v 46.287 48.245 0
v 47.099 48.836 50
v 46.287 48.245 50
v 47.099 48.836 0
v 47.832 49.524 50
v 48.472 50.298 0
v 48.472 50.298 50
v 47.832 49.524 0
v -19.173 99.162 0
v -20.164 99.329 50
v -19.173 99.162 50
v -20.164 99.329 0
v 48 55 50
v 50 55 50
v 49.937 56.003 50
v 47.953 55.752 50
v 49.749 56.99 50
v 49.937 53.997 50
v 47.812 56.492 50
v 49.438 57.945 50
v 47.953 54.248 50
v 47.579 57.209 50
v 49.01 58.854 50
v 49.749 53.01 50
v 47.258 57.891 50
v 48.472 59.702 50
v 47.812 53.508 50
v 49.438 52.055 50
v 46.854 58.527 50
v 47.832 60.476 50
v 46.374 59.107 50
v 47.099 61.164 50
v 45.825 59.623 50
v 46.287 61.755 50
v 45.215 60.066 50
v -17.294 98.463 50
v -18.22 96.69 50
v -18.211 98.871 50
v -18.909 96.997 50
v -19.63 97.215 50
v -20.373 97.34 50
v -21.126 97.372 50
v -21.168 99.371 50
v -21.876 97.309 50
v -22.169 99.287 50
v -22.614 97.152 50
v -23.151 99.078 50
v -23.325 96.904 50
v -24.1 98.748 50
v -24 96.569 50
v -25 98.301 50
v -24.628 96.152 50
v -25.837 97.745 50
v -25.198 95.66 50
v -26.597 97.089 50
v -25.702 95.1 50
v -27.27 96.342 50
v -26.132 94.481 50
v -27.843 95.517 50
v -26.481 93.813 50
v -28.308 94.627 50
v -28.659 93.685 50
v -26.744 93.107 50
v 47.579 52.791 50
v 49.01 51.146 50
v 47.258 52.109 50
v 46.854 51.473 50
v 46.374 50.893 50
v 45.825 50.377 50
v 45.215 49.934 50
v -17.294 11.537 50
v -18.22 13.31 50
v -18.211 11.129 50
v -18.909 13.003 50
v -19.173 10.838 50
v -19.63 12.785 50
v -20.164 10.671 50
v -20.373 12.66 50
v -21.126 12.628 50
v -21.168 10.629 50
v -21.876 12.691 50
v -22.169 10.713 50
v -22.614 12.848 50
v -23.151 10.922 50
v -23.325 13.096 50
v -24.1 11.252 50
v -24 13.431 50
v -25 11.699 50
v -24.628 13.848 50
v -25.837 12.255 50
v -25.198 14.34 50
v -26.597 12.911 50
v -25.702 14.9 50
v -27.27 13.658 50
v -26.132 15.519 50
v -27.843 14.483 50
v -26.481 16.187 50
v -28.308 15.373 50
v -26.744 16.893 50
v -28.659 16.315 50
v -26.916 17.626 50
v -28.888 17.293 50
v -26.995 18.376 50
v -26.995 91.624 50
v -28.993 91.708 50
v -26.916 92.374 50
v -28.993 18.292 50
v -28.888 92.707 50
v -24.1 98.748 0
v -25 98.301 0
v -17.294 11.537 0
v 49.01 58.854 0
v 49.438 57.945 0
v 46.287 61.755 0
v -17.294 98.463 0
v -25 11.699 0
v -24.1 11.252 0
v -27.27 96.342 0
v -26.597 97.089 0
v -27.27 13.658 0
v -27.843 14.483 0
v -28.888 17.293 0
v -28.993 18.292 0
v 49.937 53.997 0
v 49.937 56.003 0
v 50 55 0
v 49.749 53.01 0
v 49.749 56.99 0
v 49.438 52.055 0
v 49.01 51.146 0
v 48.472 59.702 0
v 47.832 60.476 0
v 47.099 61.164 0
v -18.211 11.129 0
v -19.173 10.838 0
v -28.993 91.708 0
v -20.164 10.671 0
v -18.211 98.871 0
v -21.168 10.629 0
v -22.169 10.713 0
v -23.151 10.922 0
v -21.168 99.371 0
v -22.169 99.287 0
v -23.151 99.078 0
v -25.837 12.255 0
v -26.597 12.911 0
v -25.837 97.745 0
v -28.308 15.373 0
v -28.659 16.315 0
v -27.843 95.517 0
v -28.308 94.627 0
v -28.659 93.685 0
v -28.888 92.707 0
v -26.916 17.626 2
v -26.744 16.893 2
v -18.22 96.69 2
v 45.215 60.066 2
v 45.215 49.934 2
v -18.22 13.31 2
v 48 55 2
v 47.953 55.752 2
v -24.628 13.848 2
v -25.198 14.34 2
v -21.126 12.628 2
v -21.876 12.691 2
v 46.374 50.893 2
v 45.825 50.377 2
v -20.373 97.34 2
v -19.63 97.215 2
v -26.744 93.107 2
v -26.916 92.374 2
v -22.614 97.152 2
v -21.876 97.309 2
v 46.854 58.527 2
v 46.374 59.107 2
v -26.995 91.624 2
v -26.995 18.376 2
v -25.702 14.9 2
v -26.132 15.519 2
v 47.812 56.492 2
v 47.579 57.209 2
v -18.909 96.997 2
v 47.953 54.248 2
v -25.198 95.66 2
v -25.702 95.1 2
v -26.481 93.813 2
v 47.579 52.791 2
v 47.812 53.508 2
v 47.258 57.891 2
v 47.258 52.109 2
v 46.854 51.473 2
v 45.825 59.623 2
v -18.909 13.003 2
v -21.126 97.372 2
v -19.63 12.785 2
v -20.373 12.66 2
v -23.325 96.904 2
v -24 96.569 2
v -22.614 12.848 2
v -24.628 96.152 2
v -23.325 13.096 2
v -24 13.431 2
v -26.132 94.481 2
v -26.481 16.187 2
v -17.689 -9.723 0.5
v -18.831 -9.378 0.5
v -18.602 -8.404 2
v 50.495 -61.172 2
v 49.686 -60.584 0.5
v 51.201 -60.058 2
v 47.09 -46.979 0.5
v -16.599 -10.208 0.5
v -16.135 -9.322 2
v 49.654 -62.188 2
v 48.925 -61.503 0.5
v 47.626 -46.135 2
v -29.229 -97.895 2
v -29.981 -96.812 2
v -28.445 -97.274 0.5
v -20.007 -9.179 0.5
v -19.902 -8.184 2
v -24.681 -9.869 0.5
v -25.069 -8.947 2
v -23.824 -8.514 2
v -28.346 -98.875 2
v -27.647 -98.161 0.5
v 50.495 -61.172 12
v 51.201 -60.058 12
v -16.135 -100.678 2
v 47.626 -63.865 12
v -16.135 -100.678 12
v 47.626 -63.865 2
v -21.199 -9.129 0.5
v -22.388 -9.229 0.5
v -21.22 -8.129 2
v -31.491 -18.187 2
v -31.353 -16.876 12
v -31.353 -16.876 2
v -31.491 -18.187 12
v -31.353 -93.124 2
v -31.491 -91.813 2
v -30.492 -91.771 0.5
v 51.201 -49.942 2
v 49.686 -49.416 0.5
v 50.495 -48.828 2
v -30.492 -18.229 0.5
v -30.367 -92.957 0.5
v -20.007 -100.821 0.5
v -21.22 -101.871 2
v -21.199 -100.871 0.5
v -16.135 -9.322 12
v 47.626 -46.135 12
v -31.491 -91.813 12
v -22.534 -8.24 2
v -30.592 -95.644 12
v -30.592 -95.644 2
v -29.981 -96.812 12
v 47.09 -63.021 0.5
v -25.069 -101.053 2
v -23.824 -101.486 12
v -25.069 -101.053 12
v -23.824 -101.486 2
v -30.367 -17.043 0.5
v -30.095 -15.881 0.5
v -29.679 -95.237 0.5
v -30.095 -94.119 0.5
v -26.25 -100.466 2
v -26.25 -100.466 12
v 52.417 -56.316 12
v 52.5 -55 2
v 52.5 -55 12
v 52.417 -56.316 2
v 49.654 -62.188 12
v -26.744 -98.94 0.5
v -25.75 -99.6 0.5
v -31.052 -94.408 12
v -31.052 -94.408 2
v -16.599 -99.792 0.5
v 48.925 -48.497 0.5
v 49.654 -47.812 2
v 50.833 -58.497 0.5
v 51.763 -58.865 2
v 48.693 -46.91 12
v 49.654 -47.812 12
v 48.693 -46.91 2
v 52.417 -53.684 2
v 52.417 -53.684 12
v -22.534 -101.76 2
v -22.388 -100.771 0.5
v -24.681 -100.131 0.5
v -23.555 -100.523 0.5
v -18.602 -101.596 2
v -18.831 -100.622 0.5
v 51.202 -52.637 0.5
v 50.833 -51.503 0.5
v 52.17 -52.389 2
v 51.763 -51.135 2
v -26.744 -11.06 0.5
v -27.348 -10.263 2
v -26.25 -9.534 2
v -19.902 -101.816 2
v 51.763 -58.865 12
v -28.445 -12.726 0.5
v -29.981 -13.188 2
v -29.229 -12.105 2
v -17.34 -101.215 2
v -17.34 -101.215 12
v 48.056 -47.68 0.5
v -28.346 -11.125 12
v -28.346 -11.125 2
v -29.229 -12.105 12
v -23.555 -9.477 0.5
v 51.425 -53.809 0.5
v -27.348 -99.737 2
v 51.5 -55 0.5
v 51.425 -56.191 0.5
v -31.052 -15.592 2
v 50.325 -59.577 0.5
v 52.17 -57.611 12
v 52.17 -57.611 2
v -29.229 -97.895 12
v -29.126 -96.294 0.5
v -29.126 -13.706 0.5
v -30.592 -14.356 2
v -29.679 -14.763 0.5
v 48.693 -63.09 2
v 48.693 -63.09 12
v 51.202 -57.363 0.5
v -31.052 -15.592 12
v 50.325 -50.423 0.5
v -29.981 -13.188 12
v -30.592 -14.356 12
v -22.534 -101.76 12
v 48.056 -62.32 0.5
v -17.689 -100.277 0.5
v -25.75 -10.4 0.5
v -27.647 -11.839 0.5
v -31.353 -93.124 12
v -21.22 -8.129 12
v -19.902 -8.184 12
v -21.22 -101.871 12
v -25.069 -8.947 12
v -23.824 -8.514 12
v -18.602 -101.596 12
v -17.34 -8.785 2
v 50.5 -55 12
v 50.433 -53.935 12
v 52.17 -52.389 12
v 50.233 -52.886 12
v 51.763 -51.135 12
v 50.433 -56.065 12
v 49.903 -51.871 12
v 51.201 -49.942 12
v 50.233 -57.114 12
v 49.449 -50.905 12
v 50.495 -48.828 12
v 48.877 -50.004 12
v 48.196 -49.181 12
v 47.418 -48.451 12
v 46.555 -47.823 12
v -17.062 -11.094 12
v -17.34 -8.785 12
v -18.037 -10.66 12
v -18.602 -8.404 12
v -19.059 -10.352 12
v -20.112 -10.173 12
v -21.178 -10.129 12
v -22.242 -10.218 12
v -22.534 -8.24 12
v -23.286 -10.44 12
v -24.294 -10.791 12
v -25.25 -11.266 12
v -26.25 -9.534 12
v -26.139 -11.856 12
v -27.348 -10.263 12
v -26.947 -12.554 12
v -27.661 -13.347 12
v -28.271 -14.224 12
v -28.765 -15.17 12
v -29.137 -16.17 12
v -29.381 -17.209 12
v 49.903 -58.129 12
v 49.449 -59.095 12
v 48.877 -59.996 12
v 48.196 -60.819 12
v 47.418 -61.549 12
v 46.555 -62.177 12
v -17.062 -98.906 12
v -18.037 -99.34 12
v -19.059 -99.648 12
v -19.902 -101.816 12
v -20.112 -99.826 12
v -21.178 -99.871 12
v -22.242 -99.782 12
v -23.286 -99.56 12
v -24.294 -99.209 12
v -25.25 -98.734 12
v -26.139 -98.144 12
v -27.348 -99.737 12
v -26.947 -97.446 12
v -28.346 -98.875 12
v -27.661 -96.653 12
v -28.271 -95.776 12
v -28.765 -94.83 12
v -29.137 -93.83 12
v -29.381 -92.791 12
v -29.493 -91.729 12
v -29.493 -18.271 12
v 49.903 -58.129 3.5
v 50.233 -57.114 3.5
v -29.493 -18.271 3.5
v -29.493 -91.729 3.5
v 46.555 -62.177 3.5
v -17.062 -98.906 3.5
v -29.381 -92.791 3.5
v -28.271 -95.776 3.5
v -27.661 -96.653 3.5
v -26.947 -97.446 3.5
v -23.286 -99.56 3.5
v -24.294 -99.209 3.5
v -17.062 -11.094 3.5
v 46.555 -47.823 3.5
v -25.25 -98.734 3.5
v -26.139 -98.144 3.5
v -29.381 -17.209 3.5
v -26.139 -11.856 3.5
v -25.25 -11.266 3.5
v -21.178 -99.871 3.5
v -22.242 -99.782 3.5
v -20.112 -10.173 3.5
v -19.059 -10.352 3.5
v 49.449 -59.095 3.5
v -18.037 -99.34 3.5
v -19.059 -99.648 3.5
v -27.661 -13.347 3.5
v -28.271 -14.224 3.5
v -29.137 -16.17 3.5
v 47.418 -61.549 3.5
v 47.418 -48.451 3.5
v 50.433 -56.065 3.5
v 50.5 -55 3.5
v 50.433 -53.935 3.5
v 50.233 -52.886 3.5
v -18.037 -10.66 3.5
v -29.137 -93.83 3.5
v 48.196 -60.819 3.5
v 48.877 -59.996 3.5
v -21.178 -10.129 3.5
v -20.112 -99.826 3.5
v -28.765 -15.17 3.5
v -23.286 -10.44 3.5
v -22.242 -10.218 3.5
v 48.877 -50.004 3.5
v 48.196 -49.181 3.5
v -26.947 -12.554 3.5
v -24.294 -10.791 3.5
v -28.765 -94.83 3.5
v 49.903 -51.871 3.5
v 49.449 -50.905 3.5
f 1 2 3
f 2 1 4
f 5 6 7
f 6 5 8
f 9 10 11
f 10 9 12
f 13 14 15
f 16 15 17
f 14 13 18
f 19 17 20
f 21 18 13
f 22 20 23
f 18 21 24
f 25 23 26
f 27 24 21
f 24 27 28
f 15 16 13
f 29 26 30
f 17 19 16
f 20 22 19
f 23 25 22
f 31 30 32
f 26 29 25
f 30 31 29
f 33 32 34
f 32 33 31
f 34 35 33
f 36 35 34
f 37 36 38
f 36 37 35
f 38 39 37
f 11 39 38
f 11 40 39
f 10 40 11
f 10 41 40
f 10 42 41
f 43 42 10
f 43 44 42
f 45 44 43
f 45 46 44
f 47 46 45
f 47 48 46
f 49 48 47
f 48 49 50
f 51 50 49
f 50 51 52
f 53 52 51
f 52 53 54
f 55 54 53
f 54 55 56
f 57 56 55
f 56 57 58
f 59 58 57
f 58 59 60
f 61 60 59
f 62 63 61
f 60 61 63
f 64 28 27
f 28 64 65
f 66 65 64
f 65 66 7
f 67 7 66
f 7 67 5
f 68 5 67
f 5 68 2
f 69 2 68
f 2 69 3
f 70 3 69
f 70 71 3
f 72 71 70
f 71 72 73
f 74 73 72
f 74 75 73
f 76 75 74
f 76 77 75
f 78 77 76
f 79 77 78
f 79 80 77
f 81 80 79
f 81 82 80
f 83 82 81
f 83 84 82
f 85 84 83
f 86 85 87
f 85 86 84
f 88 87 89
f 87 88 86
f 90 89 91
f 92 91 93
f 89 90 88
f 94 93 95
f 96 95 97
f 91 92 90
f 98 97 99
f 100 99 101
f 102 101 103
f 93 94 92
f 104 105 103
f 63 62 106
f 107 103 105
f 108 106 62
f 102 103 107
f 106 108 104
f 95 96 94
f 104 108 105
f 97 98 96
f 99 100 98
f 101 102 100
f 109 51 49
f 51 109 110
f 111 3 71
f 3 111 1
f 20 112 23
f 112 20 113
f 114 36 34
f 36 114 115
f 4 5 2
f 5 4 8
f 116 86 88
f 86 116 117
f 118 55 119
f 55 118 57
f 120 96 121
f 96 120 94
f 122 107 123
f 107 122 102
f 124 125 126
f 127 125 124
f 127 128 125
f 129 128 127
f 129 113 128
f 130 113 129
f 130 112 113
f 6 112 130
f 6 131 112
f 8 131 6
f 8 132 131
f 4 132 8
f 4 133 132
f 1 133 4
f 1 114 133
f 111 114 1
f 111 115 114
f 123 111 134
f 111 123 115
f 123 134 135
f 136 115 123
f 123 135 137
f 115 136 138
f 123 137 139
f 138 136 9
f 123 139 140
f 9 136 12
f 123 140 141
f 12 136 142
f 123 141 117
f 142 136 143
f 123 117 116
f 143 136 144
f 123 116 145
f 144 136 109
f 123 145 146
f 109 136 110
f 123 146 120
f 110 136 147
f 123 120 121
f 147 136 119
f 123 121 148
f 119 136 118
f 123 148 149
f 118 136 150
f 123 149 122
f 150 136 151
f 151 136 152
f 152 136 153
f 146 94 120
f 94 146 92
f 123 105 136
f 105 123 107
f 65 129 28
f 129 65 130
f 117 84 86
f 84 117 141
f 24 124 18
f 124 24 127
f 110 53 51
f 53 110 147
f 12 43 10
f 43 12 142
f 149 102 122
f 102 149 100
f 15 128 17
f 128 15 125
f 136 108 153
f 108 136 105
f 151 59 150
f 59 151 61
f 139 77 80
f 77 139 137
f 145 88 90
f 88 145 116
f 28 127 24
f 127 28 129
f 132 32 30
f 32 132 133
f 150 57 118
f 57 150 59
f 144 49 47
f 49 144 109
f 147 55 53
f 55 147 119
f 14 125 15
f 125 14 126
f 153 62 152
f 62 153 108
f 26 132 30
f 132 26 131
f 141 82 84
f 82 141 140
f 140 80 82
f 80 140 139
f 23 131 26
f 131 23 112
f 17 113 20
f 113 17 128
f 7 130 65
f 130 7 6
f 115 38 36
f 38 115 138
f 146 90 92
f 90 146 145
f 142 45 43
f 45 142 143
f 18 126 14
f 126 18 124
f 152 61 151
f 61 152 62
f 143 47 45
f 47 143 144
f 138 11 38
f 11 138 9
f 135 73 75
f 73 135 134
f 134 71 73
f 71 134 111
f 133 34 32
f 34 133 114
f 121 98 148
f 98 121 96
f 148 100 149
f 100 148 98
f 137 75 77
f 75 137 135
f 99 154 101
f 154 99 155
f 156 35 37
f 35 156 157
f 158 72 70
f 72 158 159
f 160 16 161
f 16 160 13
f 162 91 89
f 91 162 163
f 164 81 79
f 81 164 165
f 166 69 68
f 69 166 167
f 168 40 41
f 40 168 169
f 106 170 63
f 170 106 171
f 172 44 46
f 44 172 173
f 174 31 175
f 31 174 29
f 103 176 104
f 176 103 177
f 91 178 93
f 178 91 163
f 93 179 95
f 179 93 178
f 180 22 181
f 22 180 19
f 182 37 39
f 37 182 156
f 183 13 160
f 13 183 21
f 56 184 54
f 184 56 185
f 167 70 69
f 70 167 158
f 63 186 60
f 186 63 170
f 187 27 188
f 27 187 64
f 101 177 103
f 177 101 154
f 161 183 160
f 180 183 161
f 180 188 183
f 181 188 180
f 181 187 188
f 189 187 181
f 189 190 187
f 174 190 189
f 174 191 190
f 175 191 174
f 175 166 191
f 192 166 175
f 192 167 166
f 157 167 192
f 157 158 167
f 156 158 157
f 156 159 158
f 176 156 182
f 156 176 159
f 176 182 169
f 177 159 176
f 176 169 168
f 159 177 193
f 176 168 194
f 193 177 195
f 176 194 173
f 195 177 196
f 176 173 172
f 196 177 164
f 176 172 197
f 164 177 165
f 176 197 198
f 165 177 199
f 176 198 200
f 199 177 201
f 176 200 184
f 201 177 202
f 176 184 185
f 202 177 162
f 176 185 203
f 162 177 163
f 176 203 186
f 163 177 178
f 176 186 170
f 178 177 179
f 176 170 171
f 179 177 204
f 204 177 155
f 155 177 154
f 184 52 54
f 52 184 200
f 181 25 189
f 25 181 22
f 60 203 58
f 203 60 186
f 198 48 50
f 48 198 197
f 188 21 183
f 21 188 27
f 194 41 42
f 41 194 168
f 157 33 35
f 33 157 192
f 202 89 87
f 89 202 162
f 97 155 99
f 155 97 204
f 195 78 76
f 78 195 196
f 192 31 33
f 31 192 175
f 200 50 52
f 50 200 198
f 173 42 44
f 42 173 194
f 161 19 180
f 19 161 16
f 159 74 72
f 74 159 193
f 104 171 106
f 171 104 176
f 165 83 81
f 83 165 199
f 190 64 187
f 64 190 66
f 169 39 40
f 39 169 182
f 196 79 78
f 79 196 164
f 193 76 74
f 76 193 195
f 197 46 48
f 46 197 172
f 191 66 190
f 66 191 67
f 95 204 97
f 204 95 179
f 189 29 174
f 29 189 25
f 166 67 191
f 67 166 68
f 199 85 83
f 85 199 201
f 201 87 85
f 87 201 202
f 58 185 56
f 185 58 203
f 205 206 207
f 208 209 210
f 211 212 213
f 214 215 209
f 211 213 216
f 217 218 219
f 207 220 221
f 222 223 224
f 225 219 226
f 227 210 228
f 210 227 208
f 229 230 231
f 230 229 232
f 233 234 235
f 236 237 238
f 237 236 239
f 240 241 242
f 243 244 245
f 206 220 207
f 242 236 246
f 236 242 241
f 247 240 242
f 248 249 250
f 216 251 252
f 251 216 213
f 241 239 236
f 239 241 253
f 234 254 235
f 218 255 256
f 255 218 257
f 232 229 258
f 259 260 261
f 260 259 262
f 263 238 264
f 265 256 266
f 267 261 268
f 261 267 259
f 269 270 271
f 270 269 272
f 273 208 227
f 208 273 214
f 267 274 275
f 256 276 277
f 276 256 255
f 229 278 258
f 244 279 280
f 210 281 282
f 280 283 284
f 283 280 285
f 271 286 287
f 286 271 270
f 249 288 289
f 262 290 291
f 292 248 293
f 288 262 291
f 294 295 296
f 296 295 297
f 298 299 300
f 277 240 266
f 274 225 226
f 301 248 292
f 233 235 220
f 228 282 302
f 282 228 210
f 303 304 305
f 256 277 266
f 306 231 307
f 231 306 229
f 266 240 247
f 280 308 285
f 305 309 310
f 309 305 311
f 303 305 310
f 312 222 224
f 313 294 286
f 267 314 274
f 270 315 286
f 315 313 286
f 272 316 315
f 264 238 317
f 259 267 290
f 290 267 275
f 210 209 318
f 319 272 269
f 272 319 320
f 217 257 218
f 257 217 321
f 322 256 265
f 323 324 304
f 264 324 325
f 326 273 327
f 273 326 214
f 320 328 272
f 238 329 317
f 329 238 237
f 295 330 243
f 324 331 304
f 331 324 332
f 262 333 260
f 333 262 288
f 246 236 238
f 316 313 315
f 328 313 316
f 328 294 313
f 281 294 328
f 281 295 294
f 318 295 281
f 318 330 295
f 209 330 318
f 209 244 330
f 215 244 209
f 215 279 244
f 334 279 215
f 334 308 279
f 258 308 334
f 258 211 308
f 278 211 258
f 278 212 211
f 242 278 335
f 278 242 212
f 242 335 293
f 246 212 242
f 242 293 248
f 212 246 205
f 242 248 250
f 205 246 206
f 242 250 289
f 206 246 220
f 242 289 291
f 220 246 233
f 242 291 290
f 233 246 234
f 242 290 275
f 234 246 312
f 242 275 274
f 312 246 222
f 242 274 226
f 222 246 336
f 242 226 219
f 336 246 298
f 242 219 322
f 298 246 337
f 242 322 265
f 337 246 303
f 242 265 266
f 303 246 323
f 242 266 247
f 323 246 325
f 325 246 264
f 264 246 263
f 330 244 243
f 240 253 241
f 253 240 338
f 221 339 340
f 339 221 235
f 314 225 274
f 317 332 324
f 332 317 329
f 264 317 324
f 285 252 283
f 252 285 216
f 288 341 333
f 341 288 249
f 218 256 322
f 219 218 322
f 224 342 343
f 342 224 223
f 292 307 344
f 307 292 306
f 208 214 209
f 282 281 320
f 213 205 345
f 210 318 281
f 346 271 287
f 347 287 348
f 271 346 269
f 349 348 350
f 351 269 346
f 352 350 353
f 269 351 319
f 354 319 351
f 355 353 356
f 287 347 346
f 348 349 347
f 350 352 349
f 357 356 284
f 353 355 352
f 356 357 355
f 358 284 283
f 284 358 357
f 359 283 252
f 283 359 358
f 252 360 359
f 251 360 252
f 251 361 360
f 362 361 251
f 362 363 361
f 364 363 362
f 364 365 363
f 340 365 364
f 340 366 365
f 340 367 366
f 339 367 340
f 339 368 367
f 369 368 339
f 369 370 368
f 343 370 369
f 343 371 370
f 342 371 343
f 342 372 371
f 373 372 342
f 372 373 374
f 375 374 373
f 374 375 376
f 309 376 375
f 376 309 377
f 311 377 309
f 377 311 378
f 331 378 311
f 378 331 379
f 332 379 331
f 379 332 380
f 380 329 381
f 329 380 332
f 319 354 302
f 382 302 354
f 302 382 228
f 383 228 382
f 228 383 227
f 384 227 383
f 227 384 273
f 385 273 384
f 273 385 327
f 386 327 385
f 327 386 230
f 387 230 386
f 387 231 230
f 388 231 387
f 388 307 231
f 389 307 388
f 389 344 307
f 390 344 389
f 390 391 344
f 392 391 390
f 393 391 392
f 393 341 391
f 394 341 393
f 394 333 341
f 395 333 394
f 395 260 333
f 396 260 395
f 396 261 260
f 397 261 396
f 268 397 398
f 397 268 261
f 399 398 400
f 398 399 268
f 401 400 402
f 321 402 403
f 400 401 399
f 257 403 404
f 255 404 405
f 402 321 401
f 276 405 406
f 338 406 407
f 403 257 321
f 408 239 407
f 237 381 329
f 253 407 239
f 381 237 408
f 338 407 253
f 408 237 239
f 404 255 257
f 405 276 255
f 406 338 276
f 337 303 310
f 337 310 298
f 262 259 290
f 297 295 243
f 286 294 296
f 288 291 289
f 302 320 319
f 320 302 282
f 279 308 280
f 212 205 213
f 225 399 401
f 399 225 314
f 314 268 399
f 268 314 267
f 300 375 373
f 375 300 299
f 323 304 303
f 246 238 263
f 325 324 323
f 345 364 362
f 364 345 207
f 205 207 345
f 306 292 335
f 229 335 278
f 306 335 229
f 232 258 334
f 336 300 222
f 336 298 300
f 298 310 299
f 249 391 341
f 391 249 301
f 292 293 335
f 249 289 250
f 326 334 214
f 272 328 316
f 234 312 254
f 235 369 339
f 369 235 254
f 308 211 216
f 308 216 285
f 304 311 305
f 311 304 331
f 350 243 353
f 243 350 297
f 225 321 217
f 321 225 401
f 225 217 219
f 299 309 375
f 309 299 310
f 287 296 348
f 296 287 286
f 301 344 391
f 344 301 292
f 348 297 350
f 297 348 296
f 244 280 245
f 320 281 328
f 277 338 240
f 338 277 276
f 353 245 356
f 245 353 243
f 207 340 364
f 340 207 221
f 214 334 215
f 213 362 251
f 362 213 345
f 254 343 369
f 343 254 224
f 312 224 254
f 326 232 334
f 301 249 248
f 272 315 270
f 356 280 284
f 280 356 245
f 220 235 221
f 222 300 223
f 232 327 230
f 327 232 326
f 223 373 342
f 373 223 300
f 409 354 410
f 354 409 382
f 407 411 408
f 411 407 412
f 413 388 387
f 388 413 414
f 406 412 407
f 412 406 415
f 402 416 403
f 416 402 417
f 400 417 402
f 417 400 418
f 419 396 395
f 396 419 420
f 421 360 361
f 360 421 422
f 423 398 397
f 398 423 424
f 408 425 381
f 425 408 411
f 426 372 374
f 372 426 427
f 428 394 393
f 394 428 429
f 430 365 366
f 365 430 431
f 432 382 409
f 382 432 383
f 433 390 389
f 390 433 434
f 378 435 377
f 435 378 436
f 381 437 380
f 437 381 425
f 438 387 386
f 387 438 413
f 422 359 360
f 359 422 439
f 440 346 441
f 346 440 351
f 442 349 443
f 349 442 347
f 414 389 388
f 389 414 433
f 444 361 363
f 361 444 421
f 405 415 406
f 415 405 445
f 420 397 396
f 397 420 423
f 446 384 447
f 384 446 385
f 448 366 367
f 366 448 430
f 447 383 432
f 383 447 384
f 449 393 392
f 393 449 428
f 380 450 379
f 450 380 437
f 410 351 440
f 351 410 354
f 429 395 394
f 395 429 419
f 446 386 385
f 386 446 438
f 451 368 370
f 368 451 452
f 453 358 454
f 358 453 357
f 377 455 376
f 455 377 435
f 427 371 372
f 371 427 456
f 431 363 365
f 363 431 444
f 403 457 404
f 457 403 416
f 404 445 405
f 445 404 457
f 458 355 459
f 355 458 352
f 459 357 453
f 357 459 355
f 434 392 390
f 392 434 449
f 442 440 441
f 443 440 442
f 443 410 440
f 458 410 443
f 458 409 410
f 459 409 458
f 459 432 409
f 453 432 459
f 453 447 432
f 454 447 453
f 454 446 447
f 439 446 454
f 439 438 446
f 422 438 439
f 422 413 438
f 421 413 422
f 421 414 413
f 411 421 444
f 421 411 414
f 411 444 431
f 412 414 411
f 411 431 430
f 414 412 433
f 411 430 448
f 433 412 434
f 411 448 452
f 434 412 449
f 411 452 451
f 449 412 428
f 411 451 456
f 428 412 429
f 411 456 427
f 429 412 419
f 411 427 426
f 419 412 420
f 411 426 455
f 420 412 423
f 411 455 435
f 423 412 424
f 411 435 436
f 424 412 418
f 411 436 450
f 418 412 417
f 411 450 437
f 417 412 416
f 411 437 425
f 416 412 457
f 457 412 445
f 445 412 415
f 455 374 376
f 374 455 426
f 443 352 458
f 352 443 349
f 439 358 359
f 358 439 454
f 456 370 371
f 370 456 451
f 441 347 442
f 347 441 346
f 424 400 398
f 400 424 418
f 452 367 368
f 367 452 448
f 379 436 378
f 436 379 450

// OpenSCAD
// trinket_box.scad
// library for parametric Trinket Box, Container, Enclosure, Organizer, Storage
// Author: Tony Z. Tonchev, Michigan (USA) 
// last update: February 2019

// PolyBox Number of Sides
PolyBox_Sides = 3; //[3:3-SIDED, 4:4-SIDED, 5:5-SIDED, 6:6-SIDED, 7:7-SIDED, 8:8-SIDED]

// Polybox Diameter (in mm)
PolyBox_Diameter = 100;

// Polybox Depth (in mm)
PolyBox_Depth = 50;

// Box corner radius (in mm)
PolyBox_Corner_Radius = 8; //[4:50]

// Box Thickness
PolyBox_Thickness = 2; //[1:5]

// Group
Build_Group = 1; //[1:BOTH, 2:BOX, 3:LID]

/* [Hidden] */

TZT_S = PolyBox_Sides;
TZT_R = PolyBox_Diameter/2;
TZT_D = PolyBox_Depth;
TZT_C = PolyBox_Corner_Radius;
TZT_T = PolyBox_Thickness;
$fn=50;


//TZT_Box ([sides, radius, depth, corner_radius])

if (Build_Group!=3) translate ([0,TZT_R*1.1,0]) TZT_Box ();
if (Build_Group!=2) translate ([0,-TZT_R*1.1,0]) TZT_Lid ();

module TZT_Lid () {
    translate ([0,0,7])
    difference () {
        hull () {
            TZT_Vol ([TZT_S,TZT_R+TZT_T+.5,10,TZT_C+TZT_T+.5]);
            translate ([0,0,-6]) TZT_Vol ([TZT_S,TZT_R+TZT_T-.5,1,TZT_C+TZT_T-.5]);
        }
        translate ([0,0,TZT_T]) TZT_Vol ([TZT_S,TZT_R+.5,11,TZT_C+.5]);
    }
}

module TZT_Box () {
    translate ([0,0,TZT_D/2])
        difference () {
            TZT_Vol ([TZT_S,TZT_R,TZT_D,TZT_C]);
            translate ([0,0,TZT_T]) TZT_Vol ([TZT_S,TZT_R-TZT_T,TZT_D,TZT_C-TZT_T]);
        }
}

module TZT_Vol (TZT) {
    hull ()
        for (i=[0:360/TZT[0]:359])
        rotate ([0,0,i])
        translate ([TZT[1]-TZT[3], 0, 0]) 
        cylinder (TZT[2], TZT[3], TZT[3], true);
}
